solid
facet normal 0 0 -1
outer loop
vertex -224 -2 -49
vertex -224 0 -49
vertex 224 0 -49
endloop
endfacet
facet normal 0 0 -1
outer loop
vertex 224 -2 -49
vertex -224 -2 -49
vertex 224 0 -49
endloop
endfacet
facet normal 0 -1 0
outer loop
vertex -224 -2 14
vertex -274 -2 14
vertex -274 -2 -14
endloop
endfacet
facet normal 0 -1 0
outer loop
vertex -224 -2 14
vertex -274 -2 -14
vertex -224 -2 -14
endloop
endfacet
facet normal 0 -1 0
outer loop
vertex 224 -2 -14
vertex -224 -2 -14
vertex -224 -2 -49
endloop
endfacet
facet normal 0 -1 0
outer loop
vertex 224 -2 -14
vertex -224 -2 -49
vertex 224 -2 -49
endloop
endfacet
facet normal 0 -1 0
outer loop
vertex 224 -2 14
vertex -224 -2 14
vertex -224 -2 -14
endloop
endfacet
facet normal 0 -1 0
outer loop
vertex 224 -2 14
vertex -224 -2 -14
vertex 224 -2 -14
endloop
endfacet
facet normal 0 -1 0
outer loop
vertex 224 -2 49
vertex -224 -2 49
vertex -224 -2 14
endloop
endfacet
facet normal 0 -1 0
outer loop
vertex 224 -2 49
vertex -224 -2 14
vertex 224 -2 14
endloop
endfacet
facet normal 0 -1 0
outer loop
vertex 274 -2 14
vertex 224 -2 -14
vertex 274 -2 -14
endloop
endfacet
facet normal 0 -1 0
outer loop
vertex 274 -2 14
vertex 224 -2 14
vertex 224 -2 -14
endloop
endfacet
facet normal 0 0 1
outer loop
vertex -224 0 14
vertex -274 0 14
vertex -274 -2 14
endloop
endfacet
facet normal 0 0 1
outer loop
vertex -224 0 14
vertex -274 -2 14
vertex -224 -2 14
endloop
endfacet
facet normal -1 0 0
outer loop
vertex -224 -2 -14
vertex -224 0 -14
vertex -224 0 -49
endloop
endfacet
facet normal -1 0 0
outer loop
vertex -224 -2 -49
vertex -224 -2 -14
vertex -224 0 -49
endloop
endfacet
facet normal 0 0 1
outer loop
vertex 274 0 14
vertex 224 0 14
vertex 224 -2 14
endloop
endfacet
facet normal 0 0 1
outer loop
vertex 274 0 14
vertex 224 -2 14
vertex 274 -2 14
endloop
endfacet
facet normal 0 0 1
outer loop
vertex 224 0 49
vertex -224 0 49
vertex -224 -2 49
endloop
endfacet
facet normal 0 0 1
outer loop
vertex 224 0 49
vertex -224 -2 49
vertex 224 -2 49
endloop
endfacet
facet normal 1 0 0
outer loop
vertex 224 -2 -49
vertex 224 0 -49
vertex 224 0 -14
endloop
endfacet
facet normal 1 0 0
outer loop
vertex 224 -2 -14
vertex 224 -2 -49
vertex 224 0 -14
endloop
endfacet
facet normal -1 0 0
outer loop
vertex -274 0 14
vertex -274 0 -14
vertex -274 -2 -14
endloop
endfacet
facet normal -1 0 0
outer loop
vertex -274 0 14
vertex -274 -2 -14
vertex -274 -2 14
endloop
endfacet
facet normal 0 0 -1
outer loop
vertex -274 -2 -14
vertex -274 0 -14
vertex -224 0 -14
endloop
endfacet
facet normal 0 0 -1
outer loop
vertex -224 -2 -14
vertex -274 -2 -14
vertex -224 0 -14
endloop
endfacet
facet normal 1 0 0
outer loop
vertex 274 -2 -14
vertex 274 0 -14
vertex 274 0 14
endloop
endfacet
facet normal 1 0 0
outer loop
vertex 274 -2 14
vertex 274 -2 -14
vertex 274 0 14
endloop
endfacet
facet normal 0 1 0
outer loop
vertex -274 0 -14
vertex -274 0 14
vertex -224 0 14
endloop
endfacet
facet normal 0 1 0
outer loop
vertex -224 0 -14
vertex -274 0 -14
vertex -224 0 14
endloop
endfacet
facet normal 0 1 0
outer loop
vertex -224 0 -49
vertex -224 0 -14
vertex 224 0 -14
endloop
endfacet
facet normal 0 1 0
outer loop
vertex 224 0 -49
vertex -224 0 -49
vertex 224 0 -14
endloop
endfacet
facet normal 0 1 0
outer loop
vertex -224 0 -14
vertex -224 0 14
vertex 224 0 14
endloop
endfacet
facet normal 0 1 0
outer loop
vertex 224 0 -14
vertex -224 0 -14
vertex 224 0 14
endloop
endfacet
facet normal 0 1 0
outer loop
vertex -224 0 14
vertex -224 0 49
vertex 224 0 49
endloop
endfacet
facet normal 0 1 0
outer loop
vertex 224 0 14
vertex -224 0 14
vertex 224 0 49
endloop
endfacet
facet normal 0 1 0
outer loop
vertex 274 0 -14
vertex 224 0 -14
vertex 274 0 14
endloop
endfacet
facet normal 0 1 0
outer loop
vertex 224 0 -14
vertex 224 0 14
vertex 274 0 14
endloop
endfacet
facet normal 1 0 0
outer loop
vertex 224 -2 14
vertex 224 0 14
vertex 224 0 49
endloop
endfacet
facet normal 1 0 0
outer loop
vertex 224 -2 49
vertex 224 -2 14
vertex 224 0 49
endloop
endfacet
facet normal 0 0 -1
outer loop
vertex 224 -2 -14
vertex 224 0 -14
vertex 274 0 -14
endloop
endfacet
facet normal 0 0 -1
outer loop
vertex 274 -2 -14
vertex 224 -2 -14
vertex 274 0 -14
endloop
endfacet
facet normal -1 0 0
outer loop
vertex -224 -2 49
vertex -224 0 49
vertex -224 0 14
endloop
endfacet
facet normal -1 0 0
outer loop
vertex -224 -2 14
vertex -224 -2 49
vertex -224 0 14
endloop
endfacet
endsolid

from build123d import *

# Parameters (mm, degrees)
F0_W     = 448
F0_H     = 14
F0_H_2   = 21
F0_H_3   = 28
F0_W_2   = 50
F1_DEPTH = 2


with BuildPart() as f1:
    # F0 (on Front) → F1 (new body)
    with BuildSketch(Plane.XZ):
        with Locations((0, 42)):
            Rectangle(F0_W, F0_H)
        with Locations((0, 24.5)):
            Rectangle(F0_W, F0_H_2)
        Rectangle(F0_W, F0_H_3)
        with Locations((-249, 0)):
            Rectangle(F0_W_2, F0_H_3)
        with Locations((0, -21)):
            Rectangle(F0_W, F0_H)
        with Locations((0, -38.5)):
            Rectangle(F0_W, F0_H_2)
        with Locations((249, 0)):
            Rectangle(F0_W_2, F0_H_3)
    extrude(amount=F1_DEPTH)


solid = f1.part
